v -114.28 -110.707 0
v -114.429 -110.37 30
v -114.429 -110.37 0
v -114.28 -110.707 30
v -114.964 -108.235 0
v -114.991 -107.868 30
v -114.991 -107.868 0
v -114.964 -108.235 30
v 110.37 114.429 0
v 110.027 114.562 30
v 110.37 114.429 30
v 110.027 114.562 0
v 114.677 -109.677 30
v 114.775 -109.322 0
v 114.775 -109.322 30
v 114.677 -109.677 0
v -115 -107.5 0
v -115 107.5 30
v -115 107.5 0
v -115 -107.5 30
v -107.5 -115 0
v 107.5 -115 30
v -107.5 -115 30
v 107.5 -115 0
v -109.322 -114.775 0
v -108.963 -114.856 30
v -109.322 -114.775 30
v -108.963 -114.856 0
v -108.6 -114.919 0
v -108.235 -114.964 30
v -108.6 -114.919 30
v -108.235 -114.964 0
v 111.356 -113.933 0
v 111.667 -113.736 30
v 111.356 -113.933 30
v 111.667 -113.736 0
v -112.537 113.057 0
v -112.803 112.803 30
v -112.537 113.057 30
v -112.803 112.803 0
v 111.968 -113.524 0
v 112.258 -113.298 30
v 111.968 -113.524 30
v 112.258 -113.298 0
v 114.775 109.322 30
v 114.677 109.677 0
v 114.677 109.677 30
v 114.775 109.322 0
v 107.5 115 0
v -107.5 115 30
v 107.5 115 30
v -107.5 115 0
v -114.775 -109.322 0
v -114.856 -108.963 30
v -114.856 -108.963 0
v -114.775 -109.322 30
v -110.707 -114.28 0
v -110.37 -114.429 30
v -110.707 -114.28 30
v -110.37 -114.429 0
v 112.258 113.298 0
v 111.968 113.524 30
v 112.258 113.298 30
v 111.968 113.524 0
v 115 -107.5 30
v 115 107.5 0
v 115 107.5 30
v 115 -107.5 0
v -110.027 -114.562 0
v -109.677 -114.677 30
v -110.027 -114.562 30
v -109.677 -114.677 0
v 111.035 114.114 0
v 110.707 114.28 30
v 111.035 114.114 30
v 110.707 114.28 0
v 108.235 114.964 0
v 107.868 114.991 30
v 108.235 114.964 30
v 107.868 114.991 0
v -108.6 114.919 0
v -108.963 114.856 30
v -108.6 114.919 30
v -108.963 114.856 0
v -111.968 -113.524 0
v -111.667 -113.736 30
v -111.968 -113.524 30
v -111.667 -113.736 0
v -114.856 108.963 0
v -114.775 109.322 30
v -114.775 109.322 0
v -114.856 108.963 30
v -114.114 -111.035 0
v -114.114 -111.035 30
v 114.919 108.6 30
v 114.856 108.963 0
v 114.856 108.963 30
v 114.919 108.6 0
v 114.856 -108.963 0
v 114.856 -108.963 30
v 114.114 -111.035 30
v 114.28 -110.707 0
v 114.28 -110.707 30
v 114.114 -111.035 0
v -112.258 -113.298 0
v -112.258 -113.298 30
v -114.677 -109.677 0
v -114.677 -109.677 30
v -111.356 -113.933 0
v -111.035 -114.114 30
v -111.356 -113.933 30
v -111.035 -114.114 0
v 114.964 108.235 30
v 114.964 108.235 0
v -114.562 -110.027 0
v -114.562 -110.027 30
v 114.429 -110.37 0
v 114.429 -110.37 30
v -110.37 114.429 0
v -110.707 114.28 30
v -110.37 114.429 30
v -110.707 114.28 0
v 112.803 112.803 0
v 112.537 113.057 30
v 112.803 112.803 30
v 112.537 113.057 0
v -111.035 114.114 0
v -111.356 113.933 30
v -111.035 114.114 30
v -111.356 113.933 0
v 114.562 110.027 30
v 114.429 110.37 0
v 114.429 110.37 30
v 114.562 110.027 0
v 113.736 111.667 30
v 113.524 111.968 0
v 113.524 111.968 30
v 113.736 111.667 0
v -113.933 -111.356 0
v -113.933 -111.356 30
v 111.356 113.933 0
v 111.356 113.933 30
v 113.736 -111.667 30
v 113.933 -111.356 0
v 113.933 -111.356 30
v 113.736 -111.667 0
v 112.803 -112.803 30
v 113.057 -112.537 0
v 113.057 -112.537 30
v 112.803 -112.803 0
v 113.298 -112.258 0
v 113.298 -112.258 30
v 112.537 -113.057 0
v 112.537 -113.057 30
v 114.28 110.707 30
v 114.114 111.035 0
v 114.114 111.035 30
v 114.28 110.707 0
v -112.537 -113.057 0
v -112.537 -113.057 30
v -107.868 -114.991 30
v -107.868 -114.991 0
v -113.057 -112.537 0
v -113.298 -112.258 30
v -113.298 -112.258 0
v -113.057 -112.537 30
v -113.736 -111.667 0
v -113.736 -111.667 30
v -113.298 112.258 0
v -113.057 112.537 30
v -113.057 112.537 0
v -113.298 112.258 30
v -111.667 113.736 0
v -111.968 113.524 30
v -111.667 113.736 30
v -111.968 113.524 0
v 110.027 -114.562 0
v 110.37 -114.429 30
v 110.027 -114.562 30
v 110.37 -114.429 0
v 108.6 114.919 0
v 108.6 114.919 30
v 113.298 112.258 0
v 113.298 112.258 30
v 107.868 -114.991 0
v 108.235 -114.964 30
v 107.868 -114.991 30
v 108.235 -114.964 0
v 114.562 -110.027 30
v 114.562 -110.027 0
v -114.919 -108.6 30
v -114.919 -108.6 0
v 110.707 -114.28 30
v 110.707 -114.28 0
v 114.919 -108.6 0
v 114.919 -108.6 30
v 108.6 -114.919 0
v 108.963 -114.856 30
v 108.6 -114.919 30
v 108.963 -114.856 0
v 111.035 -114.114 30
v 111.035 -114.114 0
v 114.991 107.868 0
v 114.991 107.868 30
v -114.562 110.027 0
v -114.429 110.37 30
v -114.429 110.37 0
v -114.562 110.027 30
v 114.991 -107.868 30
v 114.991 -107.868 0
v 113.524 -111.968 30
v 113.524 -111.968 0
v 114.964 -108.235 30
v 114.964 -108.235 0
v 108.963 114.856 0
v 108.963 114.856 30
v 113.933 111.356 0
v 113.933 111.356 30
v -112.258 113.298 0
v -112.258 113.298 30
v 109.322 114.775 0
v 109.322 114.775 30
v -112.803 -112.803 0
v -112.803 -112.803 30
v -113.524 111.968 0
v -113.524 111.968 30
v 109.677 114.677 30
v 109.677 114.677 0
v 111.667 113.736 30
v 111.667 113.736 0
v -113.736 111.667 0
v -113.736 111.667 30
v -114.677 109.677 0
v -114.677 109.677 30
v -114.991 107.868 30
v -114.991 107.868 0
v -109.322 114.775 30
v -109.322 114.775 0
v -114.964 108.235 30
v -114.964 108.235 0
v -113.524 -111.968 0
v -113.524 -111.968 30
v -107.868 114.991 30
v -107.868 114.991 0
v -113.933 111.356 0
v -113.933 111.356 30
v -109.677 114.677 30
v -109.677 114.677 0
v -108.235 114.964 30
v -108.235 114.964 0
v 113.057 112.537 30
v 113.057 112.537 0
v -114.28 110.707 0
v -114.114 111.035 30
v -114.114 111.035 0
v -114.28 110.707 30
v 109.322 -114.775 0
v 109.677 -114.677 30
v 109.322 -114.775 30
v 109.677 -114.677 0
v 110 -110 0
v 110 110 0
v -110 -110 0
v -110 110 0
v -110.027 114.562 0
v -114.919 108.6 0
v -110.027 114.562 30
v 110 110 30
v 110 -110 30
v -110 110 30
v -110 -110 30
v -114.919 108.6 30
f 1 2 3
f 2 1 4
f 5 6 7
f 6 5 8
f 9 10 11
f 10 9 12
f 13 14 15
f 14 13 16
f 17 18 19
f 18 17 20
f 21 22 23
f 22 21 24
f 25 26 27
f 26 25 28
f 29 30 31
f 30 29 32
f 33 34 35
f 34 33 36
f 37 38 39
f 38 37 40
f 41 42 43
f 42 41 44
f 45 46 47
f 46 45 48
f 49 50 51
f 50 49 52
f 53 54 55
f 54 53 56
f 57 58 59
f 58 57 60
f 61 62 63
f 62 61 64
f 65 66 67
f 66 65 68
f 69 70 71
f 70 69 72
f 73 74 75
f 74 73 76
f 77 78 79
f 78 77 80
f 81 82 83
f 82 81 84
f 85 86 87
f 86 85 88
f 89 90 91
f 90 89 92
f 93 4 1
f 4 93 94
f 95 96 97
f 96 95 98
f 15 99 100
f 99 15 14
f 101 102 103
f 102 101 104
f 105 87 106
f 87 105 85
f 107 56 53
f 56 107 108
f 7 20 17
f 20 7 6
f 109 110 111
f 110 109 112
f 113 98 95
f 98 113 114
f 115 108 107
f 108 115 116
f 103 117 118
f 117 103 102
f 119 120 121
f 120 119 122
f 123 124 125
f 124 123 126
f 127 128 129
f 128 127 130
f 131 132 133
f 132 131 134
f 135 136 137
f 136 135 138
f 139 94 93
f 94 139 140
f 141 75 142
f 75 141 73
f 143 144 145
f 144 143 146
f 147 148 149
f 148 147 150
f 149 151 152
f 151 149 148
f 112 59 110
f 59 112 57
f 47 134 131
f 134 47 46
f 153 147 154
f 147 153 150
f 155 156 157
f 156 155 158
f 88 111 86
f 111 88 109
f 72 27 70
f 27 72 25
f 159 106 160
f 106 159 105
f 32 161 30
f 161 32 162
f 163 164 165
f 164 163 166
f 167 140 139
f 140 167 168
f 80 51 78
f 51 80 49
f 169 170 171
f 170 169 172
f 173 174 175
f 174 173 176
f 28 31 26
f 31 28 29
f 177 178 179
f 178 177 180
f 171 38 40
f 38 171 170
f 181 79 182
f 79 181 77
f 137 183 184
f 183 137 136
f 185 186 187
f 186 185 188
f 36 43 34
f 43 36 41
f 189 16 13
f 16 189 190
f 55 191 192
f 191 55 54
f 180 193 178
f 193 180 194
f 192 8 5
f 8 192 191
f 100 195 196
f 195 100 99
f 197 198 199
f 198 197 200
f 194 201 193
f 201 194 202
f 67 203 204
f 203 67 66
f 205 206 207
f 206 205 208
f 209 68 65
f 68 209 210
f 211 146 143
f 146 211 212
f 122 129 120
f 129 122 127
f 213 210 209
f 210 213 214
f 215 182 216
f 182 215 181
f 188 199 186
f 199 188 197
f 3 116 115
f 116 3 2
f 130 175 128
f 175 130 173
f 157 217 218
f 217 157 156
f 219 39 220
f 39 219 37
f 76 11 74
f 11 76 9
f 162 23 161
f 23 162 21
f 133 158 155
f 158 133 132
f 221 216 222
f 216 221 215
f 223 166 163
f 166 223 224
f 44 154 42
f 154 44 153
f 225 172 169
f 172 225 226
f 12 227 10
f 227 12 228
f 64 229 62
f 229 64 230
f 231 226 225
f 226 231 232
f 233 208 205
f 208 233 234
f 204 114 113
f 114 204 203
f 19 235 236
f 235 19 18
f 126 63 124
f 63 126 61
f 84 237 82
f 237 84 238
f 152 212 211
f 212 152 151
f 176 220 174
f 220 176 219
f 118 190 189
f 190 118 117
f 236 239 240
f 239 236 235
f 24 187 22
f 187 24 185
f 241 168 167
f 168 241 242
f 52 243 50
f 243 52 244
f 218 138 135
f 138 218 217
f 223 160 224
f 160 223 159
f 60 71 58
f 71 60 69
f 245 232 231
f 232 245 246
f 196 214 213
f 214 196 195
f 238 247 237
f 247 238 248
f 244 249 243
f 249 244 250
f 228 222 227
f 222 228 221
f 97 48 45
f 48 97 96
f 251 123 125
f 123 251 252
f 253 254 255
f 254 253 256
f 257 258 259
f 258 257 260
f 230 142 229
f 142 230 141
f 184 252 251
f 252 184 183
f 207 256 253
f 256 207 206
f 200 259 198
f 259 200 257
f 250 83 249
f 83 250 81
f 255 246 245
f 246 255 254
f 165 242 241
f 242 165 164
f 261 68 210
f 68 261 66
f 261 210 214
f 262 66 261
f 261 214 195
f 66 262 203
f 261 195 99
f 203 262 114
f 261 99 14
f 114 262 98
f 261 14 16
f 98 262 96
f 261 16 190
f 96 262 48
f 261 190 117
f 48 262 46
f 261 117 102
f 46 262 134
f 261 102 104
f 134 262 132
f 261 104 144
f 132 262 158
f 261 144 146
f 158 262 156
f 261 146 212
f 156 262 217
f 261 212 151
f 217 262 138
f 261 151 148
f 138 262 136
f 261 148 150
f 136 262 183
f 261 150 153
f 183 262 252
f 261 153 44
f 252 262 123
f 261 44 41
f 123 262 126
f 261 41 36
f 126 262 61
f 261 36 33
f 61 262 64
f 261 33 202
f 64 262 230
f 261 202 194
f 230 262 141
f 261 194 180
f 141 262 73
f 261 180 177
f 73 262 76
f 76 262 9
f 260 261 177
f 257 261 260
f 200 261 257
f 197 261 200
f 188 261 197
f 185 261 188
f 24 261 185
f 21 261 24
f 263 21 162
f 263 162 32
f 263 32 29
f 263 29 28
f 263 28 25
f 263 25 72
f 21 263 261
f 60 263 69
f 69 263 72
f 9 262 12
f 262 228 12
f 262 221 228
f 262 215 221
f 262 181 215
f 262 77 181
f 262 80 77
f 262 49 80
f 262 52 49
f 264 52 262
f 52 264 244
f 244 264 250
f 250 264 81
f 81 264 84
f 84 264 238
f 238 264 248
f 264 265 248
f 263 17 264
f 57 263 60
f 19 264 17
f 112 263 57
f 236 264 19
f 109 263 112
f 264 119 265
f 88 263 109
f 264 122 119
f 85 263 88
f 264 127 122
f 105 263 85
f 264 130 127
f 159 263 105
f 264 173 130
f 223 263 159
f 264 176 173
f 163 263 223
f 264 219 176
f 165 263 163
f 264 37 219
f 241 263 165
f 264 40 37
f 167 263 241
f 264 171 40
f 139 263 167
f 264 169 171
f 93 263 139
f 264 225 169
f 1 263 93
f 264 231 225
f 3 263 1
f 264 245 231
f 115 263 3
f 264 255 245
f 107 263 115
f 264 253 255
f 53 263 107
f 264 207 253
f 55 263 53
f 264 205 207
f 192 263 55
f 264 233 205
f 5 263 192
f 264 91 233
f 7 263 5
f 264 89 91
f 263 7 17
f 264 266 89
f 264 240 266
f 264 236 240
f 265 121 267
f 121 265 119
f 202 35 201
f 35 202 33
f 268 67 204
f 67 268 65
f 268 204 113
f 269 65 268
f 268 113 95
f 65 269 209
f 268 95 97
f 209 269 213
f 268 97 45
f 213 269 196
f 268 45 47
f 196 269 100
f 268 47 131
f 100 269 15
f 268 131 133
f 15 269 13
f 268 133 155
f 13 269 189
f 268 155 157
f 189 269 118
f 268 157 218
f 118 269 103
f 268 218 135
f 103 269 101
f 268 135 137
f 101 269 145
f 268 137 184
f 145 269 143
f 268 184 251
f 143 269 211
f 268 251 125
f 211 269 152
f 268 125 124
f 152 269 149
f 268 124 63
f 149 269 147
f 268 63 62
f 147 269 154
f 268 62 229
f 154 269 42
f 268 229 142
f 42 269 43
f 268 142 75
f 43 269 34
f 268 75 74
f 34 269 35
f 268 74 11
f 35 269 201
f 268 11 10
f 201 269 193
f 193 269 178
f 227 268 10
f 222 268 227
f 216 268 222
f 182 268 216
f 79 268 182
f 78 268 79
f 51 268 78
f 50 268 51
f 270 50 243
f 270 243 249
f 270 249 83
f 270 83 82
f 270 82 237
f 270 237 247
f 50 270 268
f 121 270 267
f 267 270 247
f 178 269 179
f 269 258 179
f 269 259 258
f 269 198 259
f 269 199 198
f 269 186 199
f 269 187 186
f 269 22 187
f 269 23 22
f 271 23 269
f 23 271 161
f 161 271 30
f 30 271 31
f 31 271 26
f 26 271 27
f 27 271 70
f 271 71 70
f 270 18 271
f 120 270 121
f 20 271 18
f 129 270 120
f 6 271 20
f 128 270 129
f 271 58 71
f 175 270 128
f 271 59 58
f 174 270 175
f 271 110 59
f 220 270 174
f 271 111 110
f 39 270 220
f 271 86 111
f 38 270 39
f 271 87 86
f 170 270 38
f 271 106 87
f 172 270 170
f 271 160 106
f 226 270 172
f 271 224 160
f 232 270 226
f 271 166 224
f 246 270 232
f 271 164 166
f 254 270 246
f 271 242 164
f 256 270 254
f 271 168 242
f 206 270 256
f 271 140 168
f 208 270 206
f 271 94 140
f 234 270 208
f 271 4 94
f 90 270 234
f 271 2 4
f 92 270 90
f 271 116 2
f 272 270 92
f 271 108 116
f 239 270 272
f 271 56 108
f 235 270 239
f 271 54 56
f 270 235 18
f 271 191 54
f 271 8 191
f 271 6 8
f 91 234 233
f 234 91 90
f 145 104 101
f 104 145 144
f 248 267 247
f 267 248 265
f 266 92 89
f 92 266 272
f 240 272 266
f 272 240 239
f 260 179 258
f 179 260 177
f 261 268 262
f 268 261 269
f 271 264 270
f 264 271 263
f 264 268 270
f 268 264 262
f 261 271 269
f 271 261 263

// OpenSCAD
difference() {
    minkowski() {
    cube_center([215,215,30]);
    cylinder(d=15,h=0.0001,$fn=128);
    }
    cube_center([220,220,40]);
}



module cube_center(dims) {
    translate([-dims[0]/2, -dims[1]/2, 0])
    cube(dims);
}
